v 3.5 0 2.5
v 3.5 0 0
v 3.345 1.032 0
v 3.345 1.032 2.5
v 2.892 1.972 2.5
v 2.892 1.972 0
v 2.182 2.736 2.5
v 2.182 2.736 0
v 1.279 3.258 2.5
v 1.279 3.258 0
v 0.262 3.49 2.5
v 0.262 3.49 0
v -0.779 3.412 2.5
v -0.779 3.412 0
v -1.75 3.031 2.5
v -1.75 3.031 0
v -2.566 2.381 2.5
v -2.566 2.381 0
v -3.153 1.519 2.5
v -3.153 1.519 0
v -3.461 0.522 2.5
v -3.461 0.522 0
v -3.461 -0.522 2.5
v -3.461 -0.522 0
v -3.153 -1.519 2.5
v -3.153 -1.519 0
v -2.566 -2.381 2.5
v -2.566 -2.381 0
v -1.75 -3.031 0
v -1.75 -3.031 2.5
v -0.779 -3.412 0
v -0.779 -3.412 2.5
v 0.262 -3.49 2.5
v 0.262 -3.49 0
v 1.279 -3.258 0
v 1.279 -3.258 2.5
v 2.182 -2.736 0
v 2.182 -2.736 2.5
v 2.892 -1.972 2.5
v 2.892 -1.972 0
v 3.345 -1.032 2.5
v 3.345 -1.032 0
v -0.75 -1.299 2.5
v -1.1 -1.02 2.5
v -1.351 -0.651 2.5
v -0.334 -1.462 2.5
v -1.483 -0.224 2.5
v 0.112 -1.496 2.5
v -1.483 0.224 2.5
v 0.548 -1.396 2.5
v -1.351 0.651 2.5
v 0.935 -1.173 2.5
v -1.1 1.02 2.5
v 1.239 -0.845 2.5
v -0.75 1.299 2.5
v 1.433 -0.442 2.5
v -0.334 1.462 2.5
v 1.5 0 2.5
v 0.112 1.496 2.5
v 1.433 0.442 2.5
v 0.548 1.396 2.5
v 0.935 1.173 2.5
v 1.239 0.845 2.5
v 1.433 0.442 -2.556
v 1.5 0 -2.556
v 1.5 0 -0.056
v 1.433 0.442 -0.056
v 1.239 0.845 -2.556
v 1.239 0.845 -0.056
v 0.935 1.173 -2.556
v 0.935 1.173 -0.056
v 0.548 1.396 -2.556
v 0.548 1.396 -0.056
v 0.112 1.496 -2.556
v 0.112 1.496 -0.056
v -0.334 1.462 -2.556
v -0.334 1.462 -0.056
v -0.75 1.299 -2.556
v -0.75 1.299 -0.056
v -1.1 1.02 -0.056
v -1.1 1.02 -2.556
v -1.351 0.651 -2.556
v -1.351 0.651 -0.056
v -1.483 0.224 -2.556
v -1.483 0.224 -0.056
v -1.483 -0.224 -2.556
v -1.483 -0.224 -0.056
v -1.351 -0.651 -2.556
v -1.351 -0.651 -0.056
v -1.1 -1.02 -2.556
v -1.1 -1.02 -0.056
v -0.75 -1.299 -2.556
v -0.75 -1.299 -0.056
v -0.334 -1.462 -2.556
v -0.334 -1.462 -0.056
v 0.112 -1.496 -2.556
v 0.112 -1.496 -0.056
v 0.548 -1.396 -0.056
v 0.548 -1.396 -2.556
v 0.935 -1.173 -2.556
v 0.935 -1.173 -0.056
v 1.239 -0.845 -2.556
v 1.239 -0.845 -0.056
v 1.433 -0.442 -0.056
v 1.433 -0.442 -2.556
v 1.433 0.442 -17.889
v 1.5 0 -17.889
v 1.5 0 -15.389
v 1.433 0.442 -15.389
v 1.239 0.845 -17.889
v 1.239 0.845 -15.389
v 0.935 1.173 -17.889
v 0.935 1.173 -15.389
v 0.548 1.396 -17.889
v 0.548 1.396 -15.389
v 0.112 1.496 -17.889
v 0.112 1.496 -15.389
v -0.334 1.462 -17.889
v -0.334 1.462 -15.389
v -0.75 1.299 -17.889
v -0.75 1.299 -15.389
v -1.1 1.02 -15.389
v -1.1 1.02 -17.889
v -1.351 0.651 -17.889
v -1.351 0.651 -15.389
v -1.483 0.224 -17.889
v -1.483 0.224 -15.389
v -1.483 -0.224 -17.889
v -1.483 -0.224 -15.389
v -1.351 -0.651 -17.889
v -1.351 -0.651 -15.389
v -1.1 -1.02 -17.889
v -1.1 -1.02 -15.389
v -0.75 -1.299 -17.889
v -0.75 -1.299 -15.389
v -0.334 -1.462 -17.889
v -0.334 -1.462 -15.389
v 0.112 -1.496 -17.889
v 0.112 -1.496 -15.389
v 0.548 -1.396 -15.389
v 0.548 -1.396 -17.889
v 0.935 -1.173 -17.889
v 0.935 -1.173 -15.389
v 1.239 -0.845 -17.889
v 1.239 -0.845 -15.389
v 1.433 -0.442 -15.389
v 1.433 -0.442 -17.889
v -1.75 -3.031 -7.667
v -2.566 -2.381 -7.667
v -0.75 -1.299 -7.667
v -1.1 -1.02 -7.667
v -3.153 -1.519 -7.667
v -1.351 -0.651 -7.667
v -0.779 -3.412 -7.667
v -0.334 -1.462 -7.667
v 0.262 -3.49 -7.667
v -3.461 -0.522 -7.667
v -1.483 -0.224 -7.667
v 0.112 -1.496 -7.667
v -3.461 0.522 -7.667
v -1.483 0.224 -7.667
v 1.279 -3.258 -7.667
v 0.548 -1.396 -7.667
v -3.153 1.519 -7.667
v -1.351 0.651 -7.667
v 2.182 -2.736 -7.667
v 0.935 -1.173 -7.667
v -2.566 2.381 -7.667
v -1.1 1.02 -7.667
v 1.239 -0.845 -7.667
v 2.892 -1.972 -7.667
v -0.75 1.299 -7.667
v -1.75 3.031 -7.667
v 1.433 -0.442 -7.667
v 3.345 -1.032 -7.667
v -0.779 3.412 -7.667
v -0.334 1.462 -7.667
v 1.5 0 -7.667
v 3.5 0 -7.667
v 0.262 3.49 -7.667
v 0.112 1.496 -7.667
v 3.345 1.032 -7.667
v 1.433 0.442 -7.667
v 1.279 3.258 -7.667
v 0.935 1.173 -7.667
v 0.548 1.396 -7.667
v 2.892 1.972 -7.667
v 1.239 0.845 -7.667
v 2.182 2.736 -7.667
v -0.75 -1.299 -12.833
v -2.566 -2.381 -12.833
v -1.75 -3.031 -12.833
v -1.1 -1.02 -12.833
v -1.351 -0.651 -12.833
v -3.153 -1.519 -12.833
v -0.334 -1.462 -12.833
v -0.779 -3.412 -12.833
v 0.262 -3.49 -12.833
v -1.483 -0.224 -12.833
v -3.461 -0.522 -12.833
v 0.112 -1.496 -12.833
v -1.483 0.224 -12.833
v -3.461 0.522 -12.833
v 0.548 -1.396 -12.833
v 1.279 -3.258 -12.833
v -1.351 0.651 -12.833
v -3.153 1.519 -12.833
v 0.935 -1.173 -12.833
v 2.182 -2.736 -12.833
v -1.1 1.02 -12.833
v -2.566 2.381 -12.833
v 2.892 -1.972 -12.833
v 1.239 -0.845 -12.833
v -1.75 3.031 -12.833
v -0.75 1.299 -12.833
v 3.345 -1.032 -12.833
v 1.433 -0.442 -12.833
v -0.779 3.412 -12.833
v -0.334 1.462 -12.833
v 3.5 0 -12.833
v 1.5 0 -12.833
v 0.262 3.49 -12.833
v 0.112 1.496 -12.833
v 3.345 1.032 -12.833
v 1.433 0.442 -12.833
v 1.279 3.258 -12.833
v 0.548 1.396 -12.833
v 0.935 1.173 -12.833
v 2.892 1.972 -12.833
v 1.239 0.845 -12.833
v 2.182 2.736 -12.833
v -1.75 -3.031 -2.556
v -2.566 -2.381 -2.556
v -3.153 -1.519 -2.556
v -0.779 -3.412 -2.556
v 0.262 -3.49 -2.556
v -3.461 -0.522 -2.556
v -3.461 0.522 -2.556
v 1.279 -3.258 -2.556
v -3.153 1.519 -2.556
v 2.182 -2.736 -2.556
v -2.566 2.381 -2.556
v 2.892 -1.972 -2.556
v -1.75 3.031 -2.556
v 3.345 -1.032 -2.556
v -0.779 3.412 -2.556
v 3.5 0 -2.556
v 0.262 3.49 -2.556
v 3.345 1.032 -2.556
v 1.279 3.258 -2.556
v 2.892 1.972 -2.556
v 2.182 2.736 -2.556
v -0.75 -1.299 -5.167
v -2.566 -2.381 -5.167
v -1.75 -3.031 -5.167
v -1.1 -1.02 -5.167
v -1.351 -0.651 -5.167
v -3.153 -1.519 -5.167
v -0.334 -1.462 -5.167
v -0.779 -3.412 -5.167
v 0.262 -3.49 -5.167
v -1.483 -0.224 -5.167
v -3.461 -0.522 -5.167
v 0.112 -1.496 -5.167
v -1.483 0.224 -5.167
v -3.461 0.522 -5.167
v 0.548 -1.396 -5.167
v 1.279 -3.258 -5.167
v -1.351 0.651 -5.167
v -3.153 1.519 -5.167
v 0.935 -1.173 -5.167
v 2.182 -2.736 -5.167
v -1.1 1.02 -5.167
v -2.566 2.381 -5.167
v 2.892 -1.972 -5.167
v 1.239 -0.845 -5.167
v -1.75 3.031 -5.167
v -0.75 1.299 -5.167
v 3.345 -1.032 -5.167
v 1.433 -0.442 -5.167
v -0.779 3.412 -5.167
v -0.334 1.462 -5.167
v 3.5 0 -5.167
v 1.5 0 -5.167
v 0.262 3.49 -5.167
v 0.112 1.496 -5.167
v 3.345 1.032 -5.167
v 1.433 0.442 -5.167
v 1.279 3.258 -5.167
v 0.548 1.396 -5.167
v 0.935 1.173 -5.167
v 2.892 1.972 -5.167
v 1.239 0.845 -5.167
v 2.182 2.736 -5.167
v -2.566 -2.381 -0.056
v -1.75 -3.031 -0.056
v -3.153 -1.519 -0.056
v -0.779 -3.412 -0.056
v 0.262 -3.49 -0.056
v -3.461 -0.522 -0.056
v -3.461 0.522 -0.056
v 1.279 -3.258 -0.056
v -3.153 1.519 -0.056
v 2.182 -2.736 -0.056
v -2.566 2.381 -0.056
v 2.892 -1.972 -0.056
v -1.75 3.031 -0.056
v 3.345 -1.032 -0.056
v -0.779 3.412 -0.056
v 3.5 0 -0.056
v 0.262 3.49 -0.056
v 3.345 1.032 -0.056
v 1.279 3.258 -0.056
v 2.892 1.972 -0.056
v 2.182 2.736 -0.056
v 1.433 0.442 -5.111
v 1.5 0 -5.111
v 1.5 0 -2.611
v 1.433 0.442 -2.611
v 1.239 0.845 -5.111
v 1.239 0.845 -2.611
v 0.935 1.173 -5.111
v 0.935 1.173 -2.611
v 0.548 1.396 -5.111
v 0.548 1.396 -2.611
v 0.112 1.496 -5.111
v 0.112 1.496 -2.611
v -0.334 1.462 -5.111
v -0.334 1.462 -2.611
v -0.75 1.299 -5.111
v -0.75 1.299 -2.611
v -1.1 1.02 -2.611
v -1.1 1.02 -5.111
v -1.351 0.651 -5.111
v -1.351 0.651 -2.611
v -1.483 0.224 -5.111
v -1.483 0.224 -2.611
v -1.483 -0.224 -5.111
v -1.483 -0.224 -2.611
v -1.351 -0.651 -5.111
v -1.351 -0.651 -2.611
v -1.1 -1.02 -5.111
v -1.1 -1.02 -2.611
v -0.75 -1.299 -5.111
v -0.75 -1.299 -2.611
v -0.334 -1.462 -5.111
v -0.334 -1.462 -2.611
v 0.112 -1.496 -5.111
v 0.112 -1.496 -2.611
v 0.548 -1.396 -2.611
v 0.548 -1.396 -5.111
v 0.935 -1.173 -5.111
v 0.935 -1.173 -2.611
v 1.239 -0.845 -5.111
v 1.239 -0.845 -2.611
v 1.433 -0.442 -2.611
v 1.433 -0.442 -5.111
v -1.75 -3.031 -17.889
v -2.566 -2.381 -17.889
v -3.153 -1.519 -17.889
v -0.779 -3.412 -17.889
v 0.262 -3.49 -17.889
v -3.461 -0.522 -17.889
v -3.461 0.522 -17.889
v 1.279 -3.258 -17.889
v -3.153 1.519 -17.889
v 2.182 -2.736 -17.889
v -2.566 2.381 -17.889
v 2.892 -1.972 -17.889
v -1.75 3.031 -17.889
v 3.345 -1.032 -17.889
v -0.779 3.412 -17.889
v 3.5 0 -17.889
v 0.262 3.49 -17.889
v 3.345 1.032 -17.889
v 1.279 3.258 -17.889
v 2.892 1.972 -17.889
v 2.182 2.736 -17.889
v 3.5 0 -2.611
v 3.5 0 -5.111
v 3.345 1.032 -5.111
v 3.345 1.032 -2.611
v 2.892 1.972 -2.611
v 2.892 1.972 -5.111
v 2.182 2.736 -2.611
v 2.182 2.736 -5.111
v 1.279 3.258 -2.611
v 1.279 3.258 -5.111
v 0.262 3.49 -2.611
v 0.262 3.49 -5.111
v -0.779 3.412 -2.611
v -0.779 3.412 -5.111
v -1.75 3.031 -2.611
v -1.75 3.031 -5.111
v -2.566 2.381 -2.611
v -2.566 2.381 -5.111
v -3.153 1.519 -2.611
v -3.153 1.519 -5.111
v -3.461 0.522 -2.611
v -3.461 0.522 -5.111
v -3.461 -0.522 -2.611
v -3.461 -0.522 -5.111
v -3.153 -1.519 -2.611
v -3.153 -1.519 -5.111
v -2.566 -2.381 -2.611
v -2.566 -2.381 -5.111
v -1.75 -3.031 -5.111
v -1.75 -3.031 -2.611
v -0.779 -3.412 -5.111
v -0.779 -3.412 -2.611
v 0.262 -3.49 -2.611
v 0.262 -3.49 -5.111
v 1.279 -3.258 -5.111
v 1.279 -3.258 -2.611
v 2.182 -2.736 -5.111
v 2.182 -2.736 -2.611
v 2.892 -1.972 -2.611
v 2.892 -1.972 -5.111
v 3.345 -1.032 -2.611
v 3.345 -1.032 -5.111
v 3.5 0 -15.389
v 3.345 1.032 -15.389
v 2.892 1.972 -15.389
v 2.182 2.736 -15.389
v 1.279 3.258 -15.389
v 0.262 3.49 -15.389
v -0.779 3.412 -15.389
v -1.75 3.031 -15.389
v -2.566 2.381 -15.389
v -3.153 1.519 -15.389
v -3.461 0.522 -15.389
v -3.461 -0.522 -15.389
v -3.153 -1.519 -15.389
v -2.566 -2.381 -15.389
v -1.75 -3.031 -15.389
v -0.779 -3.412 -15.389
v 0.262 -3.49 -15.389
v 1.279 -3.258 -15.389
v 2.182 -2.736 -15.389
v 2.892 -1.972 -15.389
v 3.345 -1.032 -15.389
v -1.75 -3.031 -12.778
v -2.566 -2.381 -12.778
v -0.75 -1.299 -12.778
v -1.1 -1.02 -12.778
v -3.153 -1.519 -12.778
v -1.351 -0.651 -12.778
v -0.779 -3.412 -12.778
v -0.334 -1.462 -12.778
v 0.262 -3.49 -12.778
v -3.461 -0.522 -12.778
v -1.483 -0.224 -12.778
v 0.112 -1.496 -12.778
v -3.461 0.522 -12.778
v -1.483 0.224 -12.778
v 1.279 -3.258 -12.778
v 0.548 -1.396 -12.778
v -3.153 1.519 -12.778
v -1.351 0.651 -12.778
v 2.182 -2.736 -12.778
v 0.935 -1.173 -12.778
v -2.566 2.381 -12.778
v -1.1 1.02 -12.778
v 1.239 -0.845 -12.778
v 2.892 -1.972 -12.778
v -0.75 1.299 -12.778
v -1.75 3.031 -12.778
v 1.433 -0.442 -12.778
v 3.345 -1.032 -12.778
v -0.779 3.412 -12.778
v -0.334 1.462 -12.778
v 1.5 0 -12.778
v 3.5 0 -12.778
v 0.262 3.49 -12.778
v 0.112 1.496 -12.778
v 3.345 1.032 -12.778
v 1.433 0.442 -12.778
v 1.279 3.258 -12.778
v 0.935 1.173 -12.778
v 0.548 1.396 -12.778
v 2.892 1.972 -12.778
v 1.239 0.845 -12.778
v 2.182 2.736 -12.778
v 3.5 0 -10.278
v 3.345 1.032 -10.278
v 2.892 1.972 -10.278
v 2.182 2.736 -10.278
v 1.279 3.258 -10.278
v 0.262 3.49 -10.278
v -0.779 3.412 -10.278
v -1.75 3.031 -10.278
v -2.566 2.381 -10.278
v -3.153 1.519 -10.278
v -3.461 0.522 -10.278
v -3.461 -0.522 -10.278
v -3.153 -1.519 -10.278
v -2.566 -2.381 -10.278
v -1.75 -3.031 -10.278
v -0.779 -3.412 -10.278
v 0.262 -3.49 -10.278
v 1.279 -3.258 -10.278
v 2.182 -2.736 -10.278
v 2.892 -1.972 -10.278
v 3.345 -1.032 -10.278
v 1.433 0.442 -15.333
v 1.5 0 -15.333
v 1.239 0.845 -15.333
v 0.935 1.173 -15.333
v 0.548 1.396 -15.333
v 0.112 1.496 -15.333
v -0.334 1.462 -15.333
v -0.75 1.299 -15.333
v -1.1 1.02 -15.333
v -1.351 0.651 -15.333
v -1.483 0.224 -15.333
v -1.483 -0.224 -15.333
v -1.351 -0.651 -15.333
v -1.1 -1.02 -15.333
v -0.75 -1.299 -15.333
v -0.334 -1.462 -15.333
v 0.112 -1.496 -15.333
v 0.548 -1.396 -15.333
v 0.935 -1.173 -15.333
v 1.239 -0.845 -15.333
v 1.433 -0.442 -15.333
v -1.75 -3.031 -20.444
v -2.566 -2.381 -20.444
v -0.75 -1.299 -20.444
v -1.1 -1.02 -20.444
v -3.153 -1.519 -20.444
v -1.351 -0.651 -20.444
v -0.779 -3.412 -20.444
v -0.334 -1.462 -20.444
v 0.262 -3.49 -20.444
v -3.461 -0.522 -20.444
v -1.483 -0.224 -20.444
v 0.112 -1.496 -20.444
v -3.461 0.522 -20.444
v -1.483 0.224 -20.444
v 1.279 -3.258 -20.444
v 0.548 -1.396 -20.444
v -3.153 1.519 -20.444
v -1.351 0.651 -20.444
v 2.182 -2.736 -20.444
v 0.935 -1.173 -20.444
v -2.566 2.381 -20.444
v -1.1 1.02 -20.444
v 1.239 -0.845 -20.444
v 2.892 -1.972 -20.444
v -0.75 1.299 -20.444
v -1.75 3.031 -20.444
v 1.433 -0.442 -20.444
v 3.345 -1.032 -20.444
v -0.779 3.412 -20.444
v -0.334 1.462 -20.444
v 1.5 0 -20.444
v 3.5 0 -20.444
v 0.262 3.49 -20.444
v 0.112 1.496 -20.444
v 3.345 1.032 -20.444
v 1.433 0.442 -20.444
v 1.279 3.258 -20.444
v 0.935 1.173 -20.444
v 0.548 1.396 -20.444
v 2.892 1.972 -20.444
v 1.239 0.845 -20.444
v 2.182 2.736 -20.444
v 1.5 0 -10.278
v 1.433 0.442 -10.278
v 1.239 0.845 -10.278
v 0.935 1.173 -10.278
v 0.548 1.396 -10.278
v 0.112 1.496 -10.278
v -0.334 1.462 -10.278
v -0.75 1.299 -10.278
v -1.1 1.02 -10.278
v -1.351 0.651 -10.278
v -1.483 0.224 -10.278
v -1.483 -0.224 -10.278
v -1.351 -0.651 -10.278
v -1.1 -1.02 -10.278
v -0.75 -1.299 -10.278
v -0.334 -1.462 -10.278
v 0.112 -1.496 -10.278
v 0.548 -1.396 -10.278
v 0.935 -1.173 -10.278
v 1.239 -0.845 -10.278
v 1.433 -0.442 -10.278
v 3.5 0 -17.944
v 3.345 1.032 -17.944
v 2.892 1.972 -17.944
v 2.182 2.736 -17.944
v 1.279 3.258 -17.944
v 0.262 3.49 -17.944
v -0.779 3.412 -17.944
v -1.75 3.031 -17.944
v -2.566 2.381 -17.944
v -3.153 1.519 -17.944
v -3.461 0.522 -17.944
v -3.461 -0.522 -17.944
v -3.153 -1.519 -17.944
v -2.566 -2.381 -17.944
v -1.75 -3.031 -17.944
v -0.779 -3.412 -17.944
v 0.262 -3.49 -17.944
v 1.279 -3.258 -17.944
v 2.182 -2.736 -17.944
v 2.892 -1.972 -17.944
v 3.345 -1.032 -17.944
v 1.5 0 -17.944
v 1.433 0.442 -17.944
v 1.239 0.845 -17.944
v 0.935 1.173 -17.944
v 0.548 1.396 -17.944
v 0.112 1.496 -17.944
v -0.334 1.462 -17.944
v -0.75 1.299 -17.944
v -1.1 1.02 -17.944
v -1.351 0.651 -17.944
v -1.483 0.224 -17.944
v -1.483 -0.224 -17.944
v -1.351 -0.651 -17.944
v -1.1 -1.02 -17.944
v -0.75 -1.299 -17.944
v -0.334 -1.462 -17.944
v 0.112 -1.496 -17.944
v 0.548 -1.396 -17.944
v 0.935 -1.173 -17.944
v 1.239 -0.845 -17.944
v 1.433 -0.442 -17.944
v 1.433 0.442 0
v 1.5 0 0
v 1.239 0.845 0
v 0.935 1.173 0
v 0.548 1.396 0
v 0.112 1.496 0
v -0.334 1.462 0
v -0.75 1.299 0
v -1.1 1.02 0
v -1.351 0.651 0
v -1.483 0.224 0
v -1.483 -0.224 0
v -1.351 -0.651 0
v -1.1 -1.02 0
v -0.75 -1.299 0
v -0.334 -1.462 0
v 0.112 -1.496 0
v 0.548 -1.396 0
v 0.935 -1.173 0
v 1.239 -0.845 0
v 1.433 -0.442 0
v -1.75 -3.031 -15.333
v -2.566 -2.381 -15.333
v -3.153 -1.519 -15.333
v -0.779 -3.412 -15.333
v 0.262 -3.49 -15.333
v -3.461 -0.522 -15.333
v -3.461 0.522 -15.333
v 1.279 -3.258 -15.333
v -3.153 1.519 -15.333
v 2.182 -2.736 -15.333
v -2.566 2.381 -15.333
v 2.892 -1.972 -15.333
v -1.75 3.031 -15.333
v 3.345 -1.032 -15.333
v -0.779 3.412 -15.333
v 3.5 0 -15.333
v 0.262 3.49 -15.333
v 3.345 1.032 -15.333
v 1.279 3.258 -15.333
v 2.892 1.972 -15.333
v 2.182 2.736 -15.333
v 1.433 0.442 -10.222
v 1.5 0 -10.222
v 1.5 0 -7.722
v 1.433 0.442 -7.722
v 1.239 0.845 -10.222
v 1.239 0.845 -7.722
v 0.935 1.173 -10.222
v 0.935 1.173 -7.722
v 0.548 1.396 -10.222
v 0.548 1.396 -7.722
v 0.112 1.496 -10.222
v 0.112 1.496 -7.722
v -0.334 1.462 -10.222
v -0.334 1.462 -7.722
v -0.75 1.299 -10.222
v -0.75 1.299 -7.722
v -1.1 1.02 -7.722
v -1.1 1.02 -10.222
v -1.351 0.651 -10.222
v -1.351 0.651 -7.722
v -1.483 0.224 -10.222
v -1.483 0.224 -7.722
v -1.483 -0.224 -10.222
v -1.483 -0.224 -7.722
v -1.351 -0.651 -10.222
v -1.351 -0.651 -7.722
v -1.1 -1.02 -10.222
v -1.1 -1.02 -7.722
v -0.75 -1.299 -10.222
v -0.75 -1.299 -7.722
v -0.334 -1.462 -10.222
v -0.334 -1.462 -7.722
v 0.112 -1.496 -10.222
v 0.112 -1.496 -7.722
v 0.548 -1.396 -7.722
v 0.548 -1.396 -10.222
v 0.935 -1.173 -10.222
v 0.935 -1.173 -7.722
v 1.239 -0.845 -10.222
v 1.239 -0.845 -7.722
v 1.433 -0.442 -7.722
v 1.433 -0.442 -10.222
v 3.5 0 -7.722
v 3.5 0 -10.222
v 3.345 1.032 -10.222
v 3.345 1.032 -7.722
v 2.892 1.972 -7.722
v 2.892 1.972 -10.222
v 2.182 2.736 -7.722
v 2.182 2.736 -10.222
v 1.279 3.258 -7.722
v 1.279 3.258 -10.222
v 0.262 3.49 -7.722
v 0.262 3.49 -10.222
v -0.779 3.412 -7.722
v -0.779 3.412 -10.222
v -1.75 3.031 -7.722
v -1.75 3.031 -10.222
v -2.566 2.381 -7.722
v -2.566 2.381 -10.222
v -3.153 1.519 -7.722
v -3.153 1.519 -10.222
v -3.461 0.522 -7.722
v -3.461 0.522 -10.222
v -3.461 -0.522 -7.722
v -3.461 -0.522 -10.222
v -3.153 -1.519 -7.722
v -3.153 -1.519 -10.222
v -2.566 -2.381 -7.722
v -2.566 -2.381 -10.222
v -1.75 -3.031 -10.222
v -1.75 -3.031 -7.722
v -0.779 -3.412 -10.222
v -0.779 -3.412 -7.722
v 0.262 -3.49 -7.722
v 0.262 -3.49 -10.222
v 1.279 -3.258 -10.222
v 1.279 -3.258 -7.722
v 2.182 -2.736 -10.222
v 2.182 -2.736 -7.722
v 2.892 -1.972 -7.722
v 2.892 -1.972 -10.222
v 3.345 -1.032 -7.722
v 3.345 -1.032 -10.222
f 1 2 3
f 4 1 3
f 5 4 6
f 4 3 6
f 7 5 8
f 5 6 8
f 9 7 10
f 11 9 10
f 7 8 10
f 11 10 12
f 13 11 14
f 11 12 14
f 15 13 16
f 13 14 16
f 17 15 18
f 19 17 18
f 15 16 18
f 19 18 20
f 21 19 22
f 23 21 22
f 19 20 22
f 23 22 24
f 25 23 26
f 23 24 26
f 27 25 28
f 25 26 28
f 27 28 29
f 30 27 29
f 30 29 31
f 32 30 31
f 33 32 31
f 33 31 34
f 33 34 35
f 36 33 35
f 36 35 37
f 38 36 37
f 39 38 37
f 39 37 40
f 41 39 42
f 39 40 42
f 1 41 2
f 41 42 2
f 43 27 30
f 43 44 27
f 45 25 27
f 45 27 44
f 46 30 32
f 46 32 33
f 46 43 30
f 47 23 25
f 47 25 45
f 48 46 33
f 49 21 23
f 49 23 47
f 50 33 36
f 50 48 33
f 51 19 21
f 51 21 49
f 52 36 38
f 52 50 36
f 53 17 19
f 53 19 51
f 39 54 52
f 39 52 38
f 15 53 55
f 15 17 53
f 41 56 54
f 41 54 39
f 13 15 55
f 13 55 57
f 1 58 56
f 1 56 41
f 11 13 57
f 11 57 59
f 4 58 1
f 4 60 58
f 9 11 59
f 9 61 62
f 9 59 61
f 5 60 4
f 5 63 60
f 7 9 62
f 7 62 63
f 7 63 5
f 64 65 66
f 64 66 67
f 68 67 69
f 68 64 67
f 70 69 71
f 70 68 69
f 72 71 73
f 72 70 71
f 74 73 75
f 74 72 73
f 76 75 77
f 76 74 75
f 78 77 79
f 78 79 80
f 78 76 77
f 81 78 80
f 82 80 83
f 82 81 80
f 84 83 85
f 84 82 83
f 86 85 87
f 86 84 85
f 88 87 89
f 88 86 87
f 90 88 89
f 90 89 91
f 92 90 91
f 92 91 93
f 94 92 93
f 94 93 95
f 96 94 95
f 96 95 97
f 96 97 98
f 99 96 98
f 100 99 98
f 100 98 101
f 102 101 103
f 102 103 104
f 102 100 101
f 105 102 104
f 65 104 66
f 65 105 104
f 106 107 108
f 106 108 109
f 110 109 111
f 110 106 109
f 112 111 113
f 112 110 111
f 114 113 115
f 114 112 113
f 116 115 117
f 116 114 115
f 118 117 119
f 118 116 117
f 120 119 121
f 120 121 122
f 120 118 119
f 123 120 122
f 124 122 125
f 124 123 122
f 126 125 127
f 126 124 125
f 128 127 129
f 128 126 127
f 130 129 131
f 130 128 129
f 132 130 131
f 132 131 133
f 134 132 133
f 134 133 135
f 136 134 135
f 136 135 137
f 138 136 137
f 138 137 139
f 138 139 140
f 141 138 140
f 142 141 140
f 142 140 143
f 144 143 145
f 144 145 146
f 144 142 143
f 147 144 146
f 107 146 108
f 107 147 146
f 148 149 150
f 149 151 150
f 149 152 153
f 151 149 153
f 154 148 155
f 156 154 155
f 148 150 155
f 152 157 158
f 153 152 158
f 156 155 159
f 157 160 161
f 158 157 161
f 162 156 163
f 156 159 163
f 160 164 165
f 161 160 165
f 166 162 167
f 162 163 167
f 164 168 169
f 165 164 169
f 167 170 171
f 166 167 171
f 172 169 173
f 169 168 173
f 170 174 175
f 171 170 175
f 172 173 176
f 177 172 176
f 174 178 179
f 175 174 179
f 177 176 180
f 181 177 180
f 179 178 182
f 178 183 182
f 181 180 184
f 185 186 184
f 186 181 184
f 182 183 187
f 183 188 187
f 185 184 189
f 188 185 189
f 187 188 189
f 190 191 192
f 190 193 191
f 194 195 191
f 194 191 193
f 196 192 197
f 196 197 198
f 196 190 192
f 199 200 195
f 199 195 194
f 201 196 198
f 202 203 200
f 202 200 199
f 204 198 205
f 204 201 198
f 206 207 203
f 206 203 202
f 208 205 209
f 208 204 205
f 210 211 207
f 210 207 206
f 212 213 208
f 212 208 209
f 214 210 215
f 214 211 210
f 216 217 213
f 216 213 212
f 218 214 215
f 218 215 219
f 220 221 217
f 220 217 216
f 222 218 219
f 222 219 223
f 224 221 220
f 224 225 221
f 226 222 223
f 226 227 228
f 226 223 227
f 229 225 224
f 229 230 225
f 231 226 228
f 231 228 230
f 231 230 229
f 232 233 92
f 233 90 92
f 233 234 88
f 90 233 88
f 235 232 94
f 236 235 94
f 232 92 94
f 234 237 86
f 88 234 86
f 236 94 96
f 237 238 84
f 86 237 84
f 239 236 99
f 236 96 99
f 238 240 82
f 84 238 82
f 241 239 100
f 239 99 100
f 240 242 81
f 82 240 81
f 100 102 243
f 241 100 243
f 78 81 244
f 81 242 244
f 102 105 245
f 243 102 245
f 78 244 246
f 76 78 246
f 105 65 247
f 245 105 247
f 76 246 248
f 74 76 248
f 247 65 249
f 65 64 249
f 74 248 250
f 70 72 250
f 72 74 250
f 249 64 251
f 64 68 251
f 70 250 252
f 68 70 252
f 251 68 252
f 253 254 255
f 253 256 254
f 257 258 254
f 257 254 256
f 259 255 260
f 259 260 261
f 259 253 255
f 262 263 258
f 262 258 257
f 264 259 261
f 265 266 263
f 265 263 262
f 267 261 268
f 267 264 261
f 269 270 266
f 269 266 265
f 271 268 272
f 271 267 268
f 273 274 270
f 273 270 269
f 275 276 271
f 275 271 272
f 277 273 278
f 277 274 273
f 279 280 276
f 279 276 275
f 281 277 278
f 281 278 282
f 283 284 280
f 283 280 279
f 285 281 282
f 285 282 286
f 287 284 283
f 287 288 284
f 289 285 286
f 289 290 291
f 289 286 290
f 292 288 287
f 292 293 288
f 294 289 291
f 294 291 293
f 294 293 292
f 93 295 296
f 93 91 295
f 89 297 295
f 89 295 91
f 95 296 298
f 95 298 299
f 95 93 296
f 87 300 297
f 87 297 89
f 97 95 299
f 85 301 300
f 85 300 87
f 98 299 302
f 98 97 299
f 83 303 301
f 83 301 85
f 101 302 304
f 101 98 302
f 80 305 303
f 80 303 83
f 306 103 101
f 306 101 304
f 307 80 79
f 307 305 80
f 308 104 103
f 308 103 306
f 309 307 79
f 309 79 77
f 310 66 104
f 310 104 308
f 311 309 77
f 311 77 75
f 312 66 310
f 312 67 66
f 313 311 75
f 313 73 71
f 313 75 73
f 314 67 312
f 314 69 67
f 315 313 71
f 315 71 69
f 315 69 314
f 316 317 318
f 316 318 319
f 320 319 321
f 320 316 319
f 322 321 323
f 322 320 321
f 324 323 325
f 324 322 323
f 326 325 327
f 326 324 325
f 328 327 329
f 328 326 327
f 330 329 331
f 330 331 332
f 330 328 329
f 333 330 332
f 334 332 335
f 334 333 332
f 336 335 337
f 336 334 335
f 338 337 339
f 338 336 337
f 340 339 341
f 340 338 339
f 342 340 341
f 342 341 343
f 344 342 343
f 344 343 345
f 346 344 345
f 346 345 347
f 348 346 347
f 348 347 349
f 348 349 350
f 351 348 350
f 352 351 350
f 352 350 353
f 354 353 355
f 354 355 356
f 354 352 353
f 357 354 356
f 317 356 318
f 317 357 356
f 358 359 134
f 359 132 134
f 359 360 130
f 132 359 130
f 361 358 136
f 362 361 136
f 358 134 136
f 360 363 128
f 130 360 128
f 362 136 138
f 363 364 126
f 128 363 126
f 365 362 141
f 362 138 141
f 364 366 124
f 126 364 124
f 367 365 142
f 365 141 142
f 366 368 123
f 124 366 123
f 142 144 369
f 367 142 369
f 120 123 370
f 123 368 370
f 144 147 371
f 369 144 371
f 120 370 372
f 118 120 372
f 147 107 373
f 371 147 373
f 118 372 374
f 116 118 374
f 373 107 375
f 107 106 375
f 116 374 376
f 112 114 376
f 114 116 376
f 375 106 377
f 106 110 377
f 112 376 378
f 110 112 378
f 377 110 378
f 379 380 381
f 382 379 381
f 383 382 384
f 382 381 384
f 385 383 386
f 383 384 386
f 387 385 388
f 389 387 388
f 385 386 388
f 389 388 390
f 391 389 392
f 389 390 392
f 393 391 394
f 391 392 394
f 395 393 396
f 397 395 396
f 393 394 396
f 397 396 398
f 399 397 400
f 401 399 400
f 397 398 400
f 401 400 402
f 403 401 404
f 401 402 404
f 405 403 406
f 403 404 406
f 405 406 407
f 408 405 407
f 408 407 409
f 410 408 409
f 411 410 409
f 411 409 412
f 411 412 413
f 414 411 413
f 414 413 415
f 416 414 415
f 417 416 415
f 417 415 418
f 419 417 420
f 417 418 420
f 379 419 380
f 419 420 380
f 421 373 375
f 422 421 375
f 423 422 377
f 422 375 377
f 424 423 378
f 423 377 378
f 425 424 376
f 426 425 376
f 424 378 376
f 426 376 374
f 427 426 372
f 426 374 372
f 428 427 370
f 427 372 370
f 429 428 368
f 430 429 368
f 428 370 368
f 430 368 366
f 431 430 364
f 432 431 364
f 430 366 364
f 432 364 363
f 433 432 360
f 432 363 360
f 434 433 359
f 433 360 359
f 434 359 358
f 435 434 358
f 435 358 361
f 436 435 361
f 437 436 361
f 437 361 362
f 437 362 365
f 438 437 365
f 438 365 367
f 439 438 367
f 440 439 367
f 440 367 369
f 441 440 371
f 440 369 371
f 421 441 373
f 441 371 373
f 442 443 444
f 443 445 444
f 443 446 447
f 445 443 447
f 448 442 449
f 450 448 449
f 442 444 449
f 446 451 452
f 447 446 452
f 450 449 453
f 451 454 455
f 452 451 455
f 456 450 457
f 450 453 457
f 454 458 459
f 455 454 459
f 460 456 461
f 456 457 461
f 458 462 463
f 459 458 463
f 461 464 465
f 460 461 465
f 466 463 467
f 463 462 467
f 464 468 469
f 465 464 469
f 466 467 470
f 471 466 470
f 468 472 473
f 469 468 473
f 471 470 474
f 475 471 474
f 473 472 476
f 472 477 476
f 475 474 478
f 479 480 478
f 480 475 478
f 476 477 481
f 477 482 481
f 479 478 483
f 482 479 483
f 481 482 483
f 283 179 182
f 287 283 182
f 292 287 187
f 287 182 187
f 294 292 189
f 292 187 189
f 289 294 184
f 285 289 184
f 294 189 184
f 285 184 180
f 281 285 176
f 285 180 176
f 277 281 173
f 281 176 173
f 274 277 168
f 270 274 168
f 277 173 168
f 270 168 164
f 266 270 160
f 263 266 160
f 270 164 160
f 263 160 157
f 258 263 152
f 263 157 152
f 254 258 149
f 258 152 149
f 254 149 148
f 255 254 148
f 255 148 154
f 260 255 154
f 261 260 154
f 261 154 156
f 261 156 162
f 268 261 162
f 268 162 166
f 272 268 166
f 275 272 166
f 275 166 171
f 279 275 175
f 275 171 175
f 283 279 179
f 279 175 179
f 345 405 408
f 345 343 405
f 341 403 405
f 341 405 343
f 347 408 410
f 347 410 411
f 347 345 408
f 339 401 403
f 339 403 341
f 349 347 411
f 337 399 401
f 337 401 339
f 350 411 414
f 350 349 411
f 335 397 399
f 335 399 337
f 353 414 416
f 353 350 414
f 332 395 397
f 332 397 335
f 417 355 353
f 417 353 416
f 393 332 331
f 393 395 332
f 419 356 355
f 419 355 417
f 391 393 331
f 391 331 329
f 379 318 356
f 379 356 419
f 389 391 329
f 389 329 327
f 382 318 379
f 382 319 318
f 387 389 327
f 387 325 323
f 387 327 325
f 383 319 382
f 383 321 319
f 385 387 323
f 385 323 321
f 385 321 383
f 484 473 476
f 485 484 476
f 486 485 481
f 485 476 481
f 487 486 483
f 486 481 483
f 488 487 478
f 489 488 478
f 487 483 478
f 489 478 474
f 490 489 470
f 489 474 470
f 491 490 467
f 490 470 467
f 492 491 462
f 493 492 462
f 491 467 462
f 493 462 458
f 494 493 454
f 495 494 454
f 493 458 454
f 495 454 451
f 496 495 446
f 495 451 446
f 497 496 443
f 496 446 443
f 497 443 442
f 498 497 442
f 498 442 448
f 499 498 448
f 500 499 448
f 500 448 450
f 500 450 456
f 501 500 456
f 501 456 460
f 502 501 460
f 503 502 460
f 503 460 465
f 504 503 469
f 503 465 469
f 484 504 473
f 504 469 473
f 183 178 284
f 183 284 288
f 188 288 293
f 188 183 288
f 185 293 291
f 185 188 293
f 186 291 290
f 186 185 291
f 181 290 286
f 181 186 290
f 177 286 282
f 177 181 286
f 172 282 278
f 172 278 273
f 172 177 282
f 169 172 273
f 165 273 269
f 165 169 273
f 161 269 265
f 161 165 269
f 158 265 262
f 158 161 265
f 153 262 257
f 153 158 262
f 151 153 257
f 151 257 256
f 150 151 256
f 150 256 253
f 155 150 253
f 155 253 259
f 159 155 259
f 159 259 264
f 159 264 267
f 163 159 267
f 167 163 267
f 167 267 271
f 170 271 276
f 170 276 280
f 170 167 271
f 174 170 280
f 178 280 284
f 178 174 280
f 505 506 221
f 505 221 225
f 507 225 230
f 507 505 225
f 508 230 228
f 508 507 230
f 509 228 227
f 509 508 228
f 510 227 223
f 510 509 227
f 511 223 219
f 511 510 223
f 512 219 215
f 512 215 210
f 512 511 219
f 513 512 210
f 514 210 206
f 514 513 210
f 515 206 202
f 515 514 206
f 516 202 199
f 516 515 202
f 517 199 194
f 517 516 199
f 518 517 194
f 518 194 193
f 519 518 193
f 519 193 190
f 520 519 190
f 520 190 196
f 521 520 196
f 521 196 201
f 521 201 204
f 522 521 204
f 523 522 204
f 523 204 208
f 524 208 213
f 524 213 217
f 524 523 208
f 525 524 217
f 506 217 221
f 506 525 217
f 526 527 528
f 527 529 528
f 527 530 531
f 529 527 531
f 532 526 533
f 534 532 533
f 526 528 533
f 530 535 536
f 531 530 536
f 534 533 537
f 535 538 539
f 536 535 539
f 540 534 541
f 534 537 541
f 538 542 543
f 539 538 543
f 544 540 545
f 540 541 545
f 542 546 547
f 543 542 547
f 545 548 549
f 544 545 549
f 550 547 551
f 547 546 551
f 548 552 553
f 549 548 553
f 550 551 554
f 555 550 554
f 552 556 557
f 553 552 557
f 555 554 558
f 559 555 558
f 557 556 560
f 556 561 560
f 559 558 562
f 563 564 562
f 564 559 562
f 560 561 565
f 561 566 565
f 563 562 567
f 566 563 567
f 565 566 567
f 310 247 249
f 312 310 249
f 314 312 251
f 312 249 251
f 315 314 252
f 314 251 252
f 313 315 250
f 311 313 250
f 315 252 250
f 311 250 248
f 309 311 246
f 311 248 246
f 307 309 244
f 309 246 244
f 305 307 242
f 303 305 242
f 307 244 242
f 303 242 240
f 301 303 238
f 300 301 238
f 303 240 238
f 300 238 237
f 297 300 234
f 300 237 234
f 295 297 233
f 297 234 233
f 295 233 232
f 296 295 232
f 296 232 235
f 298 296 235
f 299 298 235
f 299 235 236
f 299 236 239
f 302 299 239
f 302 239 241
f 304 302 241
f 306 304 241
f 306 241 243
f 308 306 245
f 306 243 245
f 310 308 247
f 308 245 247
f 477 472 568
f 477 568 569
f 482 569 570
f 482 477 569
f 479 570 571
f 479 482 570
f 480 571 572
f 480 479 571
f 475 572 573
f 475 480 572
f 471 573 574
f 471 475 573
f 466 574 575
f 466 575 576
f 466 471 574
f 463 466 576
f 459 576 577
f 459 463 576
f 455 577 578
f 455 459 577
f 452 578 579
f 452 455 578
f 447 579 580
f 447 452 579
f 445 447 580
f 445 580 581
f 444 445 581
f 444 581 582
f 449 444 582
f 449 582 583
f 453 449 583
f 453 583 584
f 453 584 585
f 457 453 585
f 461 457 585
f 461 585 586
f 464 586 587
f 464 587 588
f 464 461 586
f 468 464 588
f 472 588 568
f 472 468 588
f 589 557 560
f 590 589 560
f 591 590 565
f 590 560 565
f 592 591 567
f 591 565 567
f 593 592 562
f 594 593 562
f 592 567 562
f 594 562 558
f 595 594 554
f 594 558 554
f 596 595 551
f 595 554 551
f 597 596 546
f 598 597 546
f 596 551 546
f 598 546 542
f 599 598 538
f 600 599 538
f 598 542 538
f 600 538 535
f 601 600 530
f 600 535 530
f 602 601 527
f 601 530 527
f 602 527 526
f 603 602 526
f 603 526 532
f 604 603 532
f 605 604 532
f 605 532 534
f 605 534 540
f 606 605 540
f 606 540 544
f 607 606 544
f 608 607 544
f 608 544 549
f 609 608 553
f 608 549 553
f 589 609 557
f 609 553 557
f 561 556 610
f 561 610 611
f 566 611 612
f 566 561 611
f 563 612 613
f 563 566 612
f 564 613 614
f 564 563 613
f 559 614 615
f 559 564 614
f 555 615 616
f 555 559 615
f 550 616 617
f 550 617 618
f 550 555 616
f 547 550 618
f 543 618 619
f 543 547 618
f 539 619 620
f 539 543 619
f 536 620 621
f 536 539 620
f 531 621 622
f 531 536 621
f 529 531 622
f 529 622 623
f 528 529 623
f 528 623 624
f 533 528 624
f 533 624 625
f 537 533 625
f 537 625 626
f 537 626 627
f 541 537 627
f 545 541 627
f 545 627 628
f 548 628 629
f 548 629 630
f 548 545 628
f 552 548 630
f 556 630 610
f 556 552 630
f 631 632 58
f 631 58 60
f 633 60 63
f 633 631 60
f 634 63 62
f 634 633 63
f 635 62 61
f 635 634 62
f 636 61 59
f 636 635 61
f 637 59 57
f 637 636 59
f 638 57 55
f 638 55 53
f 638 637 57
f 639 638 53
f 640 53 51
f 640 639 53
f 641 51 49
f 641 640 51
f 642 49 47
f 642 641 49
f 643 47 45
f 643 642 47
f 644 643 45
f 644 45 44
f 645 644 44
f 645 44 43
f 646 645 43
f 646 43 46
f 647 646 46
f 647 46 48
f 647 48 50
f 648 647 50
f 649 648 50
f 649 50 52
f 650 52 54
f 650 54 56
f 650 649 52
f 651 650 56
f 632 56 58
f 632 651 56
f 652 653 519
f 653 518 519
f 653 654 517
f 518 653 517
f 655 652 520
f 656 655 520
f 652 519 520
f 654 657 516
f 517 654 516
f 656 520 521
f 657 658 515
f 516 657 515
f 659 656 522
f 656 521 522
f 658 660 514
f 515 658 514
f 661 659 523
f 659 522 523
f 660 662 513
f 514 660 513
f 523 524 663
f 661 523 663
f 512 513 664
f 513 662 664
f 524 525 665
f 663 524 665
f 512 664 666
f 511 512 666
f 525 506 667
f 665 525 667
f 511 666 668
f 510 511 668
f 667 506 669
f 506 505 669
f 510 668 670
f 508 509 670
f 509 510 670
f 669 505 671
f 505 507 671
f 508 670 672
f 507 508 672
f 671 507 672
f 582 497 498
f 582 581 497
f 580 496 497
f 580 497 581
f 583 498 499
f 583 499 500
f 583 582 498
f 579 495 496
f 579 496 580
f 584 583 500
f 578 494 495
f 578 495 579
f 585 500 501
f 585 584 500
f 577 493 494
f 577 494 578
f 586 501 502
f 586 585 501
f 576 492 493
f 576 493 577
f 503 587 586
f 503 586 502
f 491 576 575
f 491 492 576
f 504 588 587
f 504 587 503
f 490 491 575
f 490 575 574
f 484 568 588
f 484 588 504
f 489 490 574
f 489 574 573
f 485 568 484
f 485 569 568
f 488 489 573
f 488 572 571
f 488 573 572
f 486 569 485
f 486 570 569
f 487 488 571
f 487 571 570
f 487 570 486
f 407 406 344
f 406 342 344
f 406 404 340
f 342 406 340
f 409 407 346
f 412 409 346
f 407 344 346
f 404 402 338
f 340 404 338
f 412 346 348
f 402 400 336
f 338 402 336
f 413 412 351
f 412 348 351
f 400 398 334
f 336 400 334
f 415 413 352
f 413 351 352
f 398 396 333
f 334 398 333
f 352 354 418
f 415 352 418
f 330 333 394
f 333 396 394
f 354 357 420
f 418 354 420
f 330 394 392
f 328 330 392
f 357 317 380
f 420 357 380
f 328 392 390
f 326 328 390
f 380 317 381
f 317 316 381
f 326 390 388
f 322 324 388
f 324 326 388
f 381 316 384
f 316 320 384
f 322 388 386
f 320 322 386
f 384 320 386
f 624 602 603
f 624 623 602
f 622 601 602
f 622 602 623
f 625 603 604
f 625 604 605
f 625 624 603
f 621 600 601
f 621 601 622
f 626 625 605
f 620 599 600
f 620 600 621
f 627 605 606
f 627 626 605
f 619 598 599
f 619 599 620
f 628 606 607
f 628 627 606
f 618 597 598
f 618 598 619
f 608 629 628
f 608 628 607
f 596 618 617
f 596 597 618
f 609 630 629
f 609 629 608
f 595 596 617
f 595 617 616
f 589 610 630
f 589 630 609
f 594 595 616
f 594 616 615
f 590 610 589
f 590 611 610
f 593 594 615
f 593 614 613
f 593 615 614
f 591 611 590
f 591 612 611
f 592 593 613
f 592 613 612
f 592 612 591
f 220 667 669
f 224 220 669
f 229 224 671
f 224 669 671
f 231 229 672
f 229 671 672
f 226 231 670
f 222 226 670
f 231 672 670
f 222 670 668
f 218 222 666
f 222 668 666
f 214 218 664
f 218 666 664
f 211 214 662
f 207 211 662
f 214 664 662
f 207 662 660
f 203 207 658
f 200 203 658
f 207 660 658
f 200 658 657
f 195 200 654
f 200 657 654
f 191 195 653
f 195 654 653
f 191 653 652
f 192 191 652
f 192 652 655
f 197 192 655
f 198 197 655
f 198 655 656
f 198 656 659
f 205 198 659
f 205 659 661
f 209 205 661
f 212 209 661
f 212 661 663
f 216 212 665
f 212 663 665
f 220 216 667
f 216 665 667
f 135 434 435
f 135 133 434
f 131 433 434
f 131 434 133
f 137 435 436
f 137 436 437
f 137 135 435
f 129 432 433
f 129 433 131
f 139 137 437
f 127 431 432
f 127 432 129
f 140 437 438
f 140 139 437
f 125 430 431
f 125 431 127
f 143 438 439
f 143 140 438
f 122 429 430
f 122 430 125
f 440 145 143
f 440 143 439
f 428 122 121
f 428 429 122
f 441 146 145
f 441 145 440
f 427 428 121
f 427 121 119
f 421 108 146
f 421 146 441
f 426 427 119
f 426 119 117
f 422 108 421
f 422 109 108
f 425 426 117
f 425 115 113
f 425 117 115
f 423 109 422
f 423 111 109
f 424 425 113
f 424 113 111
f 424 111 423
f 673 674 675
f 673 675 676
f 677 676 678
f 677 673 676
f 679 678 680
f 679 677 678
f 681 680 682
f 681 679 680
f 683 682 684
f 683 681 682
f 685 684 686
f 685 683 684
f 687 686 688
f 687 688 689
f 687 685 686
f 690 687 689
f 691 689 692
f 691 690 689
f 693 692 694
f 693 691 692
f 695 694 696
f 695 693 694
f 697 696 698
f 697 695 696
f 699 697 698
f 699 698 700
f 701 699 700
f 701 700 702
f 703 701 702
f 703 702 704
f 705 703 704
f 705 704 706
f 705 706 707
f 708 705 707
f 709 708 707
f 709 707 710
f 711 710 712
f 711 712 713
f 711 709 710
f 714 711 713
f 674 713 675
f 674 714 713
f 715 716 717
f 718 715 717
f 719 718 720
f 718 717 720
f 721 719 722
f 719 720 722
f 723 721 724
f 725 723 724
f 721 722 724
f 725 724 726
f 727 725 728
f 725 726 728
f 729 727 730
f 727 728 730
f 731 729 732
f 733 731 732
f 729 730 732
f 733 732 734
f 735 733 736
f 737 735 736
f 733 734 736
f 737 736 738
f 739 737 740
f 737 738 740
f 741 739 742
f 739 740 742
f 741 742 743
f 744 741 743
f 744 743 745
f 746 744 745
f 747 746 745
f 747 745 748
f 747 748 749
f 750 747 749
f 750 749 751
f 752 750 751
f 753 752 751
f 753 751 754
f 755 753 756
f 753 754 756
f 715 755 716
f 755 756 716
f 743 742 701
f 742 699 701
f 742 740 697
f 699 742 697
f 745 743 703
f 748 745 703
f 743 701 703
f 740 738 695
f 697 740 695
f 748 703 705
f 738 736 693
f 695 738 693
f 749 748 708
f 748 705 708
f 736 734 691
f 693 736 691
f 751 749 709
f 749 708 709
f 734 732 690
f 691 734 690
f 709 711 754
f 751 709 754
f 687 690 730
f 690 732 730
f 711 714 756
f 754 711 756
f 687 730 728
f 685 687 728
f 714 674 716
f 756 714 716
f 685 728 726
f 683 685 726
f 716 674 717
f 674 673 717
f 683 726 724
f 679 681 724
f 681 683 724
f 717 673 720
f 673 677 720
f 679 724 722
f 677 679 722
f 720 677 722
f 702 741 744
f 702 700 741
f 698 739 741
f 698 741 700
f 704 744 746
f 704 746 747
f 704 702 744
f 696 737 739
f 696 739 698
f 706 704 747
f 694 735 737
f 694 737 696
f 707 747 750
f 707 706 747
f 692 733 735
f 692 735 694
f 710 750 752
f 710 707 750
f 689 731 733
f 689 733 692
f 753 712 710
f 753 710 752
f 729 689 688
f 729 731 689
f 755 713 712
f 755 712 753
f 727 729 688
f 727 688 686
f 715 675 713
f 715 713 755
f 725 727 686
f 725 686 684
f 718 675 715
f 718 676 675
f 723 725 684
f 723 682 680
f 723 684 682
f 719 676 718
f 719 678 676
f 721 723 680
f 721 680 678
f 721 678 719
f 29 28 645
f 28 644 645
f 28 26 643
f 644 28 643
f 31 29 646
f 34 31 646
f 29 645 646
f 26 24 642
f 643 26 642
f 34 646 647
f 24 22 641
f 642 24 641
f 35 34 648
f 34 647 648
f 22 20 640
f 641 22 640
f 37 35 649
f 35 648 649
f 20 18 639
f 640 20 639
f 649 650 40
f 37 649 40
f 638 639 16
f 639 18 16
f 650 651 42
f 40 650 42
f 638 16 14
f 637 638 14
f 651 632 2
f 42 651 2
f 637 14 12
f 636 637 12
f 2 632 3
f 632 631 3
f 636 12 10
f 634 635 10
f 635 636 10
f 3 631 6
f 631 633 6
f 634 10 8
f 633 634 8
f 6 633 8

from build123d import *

# Parameters (mm, degrees)
SKETCH_1_R             = 3.5
SKETCH_1_R_2           = 1.5
EXTRUDE_1_DEPTH        = 2.5
PATTERN_LINEAR_1_COUNT = 9
PATTERN_LINEAR_1_PITCH = 2.555555556


with BuildPart() as part:
    # 草图1 → 凸台-拉伸1 (new body)
    with BuildSketch(Plane.XY):
        Circle(SKETCH_1_R)
        Circle(SKETCH_1_R_2, mode=Mode.SUBTRACT)
    extrude(amount=EXTRUDE_1_DEPTH)


with BuildPart() as pattern_linear_1_1:
    # 阵列(线性)1: pattern copy
    add(part.part.moved(Location(Vector(0, 0, -1) * (1 * PATTERN_LINEAR_1_PITCH))))


with BuildPart() as pattern_linear_1_2:
    # 阵列(线性)1: pattern copy
    add(part.part.moved(Location(Vector(0, 0, -1) * (2 * PATTERN_LINEAR_1_PITCH))))


with BuildPart() as pattern_linear_1_3:
    # 阵列(线性)1: pattern copy
    add(part.part.moved(Location(Vector(0, 0, -1) * (3 * PATTERN_LINEAR_1_PITCH))))


with BuildPart() as pattern_linear_1_4:
    # 阵列(线性)1: pattern copy
    add(part.part.moved(Location(Vector(0, 0, -1) * (4 * PATTERN_LINEAR_1_PITCH))))


with BuildPart() as pattern_linear_1_5:
    # 阵列(线性)1: pattern copy
    add(part.part.moved(Location(Vector(0, 0, -1) * (5 * PATTERN_LINEAR_1_PITCH))))


with BuildPart() as pattern_linear_1_6:
    # 阵列(线性)1: pattern copy
    add(part.part.moved(Location(Vector(0, 0, -1) * (6 * PATTERN_LINEAR_1_PITCH))))


with BuildPart() as pattern_linear_1_7:
    # 阵列(线性)1: pattern copy
    add(part.part.moved(Location(Vector(0, 0, -1) * (7 * PATTERN_LINEAR_1_PITCH))))


with BuildPart() as pattern_linear_1_8:
    # 阵列(线性)1: pattern copy
    add(part.part.moved(Location(Vector(0, 0, -1) * (8 * PATTERN_LINEAR_1_PITCH))))


solid = Compound([part.part, pattern_linear_1_1.part, pattern_linear_1_2.part, pattern_linear_1_3.part, pattern_linear_1_4.part, pattern_linear_1_5.part, pattern_linear_1_6.part, pattern_linear_1_7.part, pattern_linear_1_8.part])
